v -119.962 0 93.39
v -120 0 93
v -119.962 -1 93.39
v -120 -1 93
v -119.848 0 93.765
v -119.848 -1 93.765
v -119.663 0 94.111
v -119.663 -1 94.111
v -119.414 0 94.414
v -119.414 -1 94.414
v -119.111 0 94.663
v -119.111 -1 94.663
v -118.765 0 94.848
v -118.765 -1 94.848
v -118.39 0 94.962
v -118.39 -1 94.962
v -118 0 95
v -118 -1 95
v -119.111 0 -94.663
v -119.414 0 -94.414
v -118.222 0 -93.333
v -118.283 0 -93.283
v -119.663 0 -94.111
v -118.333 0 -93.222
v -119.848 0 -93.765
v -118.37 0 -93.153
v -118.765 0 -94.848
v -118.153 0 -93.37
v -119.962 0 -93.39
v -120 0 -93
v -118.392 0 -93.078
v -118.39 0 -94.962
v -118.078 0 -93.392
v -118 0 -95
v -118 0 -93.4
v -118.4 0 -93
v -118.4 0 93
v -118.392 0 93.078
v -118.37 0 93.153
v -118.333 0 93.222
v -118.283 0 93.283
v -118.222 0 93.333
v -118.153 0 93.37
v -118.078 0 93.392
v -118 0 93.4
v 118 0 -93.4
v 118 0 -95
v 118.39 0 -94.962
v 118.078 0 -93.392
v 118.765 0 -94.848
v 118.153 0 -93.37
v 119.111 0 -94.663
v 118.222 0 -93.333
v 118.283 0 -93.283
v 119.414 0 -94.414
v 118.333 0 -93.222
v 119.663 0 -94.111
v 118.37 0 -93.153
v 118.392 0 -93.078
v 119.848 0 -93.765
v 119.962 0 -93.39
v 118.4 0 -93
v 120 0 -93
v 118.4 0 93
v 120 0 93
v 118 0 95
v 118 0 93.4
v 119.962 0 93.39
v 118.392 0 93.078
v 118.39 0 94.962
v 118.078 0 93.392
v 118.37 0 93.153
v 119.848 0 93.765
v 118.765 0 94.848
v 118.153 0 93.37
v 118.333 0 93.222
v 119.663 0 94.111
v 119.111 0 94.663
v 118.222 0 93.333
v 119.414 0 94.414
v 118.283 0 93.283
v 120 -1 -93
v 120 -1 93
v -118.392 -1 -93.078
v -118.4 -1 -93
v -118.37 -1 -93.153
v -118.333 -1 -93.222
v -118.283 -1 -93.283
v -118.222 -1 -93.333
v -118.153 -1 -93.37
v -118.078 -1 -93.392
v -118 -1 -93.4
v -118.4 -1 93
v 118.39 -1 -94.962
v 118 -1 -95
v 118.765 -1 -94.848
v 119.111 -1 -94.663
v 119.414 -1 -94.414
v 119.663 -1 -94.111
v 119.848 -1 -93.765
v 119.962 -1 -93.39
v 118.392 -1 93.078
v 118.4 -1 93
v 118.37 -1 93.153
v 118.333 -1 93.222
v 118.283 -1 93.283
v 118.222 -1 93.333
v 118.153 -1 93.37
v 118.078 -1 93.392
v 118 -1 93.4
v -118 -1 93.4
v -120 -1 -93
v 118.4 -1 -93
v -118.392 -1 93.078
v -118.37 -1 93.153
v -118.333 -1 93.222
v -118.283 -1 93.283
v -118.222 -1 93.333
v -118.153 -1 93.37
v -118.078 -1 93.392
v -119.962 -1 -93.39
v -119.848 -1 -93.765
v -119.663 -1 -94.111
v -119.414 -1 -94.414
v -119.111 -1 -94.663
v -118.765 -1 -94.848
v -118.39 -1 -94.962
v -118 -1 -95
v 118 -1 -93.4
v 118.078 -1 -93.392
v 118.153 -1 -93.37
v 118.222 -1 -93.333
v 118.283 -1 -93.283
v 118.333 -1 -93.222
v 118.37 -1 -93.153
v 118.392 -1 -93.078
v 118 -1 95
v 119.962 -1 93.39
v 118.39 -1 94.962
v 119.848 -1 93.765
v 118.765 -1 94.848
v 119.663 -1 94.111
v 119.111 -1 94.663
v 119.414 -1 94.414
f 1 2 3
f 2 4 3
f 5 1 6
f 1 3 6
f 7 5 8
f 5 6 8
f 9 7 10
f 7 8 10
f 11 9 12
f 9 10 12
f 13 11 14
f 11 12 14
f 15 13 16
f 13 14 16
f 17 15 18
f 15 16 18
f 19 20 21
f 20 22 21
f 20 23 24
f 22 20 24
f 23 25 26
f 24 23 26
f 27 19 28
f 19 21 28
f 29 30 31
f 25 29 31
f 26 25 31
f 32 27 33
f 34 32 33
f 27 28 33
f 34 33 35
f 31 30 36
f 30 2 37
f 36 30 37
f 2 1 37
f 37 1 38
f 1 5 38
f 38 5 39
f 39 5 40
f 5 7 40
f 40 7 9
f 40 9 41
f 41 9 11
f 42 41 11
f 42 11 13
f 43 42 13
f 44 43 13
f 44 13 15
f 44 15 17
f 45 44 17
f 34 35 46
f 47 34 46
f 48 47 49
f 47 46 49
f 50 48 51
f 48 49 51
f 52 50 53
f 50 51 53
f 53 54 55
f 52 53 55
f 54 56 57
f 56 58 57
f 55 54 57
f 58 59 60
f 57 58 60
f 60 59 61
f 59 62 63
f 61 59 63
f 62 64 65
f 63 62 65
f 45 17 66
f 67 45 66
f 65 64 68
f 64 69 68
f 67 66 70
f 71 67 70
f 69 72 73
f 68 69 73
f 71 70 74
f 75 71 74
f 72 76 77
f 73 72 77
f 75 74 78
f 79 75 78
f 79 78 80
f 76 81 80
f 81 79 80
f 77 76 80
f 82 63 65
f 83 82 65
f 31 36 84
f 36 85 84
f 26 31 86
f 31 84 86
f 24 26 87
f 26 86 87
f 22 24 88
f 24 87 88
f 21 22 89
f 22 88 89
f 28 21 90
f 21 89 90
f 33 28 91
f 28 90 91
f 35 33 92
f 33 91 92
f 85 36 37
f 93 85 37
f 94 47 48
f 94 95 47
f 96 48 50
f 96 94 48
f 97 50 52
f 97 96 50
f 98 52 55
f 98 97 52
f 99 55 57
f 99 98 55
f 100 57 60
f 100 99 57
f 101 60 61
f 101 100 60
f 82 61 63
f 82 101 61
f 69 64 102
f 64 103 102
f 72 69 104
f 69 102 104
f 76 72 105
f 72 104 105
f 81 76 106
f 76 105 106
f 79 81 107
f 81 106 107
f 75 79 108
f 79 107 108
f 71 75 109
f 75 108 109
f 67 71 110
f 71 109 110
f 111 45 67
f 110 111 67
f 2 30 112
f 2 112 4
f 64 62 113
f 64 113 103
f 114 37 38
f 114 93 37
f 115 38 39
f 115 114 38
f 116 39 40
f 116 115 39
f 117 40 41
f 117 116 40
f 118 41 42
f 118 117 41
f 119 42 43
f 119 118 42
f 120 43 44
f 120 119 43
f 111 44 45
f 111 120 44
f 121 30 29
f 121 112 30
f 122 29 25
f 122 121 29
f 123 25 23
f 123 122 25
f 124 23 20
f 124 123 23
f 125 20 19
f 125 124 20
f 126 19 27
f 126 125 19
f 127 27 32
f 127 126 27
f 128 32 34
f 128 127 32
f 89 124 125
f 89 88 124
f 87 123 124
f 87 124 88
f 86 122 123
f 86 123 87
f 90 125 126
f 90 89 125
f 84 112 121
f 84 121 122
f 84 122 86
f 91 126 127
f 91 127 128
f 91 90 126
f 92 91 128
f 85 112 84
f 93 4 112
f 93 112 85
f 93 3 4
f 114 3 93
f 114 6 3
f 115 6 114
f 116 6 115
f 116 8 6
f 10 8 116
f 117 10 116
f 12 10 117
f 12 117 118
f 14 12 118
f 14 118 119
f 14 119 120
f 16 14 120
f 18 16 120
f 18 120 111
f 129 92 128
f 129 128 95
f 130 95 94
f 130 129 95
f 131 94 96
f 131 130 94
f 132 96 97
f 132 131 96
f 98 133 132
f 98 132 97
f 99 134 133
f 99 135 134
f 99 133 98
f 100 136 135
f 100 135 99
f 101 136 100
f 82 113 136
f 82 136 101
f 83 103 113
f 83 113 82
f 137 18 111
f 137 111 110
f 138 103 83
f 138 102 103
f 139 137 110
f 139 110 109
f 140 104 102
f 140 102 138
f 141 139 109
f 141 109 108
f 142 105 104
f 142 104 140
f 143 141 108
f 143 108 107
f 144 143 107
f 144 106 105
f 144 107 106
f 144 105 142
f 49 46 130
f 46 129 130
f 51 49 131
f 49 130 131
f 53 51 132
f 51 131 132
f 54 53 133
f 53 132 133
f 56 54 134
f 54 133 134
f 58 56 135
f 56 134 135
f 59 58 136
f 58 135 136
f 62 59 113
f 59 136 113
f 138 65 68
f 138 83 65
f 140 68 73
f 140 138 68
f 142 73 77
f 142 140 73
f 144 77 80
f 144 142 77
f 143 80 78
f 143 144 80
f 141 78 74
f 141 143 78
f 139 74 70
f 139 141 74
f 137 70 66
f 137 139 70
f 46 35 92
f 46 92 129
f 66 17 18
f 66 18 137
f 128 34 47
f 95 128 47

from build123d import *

# Parameters (mm, degrees)
F0_W     = 240
F0_H     = 190
F1_DEPTH = 1
F2_R     = 2
F3_T     = -1.6


with BuildPart() as f1:
    # F0 (on Front) → F1 (new body)
    with BuildSketch(Plane.XZ):
        Rectangle(F0_W, F0_H)
    extrude(amount=F1_DEPTH)

    # F2
    f2_edges = [f1.edges().sort_by_distance(p)[0] for p in [
        (120, -0.5, 95),
        (-120, -0.5, 95),
        (-120, -0.5, -95),
        (120, -0.5, -95),
    ]]
    fillet(f2_edges, radius=F2_R)

    # F3
    f3_openings = [f1.faces().sort_by_distance(p)[0] for p in [
        (0, 0, 0),
        (0, -1, 0),
    ]]
    offset(amount=F3_T, openings=f3_openings)


solid = f1.part
